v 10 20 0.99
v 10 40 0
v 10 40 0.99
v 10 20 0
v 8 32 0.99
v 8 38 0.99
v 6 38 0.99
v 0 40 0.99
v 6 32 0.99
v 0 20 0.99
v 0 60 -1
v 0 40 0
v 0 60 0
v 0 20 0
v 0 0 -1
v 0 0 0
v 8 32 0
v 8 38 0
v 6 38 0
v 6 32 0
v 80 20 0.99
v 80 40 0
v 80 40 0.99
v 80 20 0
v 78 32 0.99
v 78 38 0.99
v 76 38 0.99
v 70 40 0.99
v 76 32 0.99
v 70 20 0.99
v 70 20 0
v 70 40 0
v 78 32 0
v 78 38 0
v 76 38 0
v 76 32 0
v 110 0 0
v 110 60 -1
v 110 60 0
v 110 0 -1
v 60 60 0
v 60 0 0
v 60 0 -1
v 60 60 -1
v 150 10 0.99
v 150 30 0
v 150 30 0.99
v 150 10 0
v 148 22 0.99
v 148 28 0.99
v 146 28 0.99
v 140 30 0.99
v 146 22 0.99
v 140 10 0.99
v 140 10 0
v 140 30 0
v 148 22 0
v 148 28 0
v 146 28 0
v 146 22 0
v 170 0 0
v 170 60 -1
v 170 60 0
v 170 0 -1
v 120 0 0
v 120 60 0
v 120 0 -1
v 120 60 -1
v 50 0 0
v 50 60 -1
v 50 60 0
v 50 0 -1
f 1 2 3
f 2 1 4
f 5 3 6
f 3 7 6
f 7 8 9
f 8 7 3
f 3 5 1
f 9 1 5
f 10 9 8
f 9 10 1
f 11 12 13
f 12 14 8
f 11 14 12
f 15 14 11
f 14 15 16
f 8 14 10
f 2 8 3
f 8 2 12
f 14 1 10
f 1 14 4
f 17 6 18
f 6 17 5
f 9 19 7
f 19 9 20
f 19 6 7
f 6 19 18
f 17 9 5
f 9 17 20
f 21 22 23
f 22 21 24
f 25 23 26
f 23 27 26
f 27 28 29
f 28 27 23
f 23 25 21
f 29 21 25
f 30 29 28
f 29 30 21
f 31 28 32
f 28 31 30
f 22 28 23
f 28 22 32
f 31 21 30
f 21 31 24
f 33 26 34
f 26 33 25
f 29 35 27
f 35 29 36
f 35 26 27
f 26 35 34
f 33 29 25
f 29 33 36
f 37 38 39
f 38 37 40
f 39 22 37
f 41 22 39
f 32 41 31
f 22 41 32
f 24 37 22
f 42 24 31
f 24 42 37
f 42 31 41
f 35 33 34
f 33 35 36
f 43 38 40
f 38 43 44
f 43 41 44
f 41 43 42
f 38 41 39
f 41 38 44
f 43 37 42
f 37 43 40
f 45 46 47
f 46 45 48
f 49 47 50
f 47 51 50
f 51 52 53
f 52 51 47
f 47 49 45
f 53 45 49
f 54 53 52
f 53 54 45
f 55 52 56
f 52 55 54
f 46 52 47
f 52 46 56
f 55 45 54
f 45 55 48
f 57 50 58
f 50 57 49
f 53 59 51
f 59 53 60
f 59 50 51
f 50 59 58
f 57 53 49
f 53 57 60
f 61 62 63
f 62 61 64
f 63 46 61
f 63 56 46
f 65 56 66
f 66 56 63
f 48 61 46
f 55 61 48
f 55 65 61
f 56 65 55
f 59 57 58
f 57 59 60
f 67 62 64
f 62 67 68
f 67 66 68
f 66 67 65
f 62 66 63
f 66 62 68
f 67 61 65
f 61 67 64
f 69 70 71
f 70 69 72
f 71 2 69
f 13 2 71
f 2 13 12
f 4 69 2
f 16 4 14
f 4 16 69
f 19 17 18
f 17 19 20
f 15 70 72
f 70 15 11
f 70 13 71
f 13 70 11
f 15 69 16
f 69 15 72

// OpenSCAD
// file: ../../Base/PlacementOptions.scad
// Fischertechnik Box Foundation
// Placement Options

// Alignment
NoAlign = 0;
AlignLeft = 1;
AlignBottom = 2;
AlignCenter = 3;
AlignRight = 4;
AlignTop = 5;

// Element rotation degree steps
rotations = [0, -90, -180, -270];

// Rotation
NoRotation = 0;
Rotate0 = 0;
Rotate90 = 1;
Rotate180 = 2;
Rotate270 = 3;

// Docking (seen from above)
NoDock = -1;
DockLeft = 0;
DockTop = 1;
DockRight = 2;
DockCorner = 2;
DockBottom = 3;

// Web corners
LowerLeft = 0;
UpperLeft = 1;
UpperRight = 2;
LowerRight = 3;

// Web position relative to corner
LeftOfCorner = 0;
RightOfCorner = 1;
// file: ../../Base/Boxes.scad
// Fischertechnik Box Foundation
// Pre-designed Boxes

use <Constants.scad>

include <PlacementOptions.scad>

box190Width = 190;
box190Depth = 130;
box130Width = 130;
box130Depth = 95;
boxUsageHeight = 33.9;
boxWallThickness = 2.4;
boxBaseThickness = 1.0;
boxWebWidth = 3.0;

// getBoxWallThickness()
// Gets the wall thickness of a Fischertechnik Box

function getBoxWallThickness() = boxWallThickness;

// Gets the usable height of a fischertechnik box
function getBoxUsageHeight() = boxUsageHeight;

// Gets the thickness of the Fischertechnik box base.
function getBoxBaseThickness() = boxBaseThickness;

// Gets the width of a box web
function getBoxWebWidth() = boxWebWidth;

// Gets the usable inner space of a Box 190 as an x/y-list
function getBox190Space() = [
    box190Width - 2*getBoxWallThickness(), 
    box190Depth - 2*getBoxWallThickness() ];

// Imports the Fischertechnik empty box 130x190 mm and places it at position 0,0
// 190x130 are the outer sizes, the inner space is slightly smaller. Use getBox190Space() to get the inner sizes.
// This module needs the STL file "Fischertechnik Box 130x190.stl" in the library path.
// The box is positioned that the usable inner space is at the 0,0,0 position. The

module Box190() {
    translate([-getBoxWallThickness(),-getBoxWallThickness(),-getBoxBaseThickness()])
        import("Fischertechnik Box 130x190.stl", convexity=3);
}

// Gets the usable inner space of a Box 130 as an x/y-list
function getBox130Space() = [
    box130Width - 2*getBoxWallThickness(), 
    box130Depth - 2*getBoxWallThickness() ];

// Imports the Fischertechnik empty box 95x130 mm and places it at position 0,0
// 190x130 are the outer sizes, the inner space is slightly smaller. Use getBox190Space() to get the inner sizes.
// This module needs the STL file "Fischertechnik Box 95x130.stl" in the library path.
// The box is positioned that the usable inner space is at the 0,0,0 position. The

module Box130() {
    translate([-getBoxWallThickness(),-getBoxWallThickness(),-getBoxBaseThickness()])
        import("Fischertechnik Box 95x130.stl", convexity=3);
}

// Creates a web at the specified box walls
// corner 0 = LowerLeft, 1 = UpperLeft, 2 = UpperRight, 3 = LowerRight
// side 0 = LeftOfCorner, 1 = RightOfCorner
// distance = Distance in mm from the corner
// box = inner width and depth of the box (default: Box 190)
// webWidth = length of the web (default is 3 mms)
// webThickness = thickness of the web (default is 1 mm)

module BoxWeb(corner, side, distance, box=getBox190Space(), webWidth=getBoxWebWidth(), webThickness=1.0) {
    sink = getBoxWallThickness()/2;

    width = (corner % 2 == 0) ? 
            (side == LeftOfCorner ? webWidth : webThickness) :
            (side == LeftOfCorner ? webThickness : webWidth);

    depth = (corner % 2 == 0) ? 
            (side == RightOfCorner ? webWidth : webThickness) :
            (side == RightOfCorner ? webThickness : webWidth);
    
    xDiff = corner == LowerLeft ? 
                (side == LeftOfCorner ? -sink : distance) :
            (corner == UpperLeft ?                
                (side == LeftOfCorner ? distance : -sink) :
            (corner == UpperRight ?
                (side == LeftOfCorner ? box.x-webWidth+sink : box.x-distance-webThickness) :
                (side == LeftOfCorner ? box.x-distance-webThickness: box.x-webWidth+sink)));

    yDiff = corner == LowerLeft ? 
                (side == RightOfCorner ? -sink : distance) :
            (corner == UpperLeft ?
                (side == RightOfCorner ? box.y-distance : box.y-webWidth+sink) :
            (corner == UpperRight ?
                (side == RightOfCorner ? box.y-webWidth+sink : box.y-distance) :
                (side == RightOfCorner ? distance : -sink)));
    
    translate([xDiff, yDiff, -getExcess()])
        cube([width, depth, boxUsageHeight + 2*getExcess()]);
}
// file: ../../Base/Rotation.scad
// Fischertechnik Box Foundation
// Geometry Helpers Rotation

include <PlacementOptions.scad>

// getRotatedSpace(space, rotation=NoRotation)
// Rotates the space dependent on the specified rotation

function getRotatedSpace(space, rotation=NoRotation) = [
    (rotation == Rotate90 || rotation == Rotate270) ? space.y : space.x,
    (rotation == Rotate90 || rotation == Rotate270) ? space.x : space.y
];

// Rotates the given space around the fixed left lower corner
// space = the space the children needs as width/depth list [width,depth]
// rotation = 0 Rotate0 degrees, 1 Rotate90 degrees, 2 Rotate180 degrees, 3 Rotate270 degrees (equivalent to -90)

module RotateFix(space, rotation=Rotate0) {
    dy = (rotation == Rotate0 || rotation == Rotate270) ? 0 :
        (rotation == Rotate90) ? space.x :
        space.y;
    dx = (rotation < Rotate180) ? 0 :
        (rotation == Rotate180) ? space.x :
        space.y;
    
    translate([dx, dy, 0])
        rotate([0, 0, rotations[rotation]])
            children();
}
// file: ../../Base/Alignment.scad
// Fischertechnik Box Foundation
// Geometry Helpers Alignment

include <PlacementOptions.scad>

// getAlignedX(elementWidth, spaceWidth, align=AlignRight, offset=0)
// Gets the aligned X offset of an element with the given
// width in the given space.
// elementWidth = The width of the element to positon
// spaceWidth = The space where the element should be aligned
// align = 0 AlignLeft, 1 AlignCenter, 2 AlignRight
// offset = an optional offset from the aligned position. When
// aligned left or centered, then positive values are in X direction.
// When aligned right then positive values are in negative X direction.

function getAlignedX(elementWidth, spaceWidth, align=AlignRight, offset=0) =
    (align == AlignLeft) ?
        offset :
        ((align == AlignCenter) ?
        (spaceWidth - elementWidth)/2 + offset :
        spaceWidth - offset - elementWidth);

// getAlignedY(elementDepth, spaceDepth, align=AlignTop, offset=0)
// Gets the aligned Y offset of an element with the given
// depth in the given space.
// elementDepth = The depth of the element to positon
// spaceDepth = The space where the element should be aligned
// align = 0 AlignBottom, 1 AlignCenter, 2 AlignTop
// offset = an optional offset from the aligned position. When
// aligned bottom or centered, then positive values are in Y direction.
// When aligned top then positive values are in negative Y direction.

function getAlignedY(elementDepth, spaceDepth, align=AlignTop, offset=0) =
    (align == AlignBottom) ?
        offset :
        ((align == AlignCenter) ?
        (spaceDepth - elementDepth)/2 + offset :
        spaceDepth - offset - elementDepth);
// file: ../../Base/Constants.scad
// Fischertechnik Box Foundation
// Constants

// Constant values necessary for multiple elements

// Base constants
dividerThickness = 1.2;
excess = 0.01;
fragments = 90;
tolerance = 0.8;

// Gets the thickness of a divider 
function getDividerThickness() = dividerThickness;

// Gets the excess that is used to merge walls into each other
function getExcess() = excess;

// Gets amount of fragments of a cylinder
function getFragments() = fragments;

// Gets the inner tolerance of a frame to each side
function getTolerance() = tolerance;


// Fischertechnik specific constants
axisDiameter = 4;
axisBottomDiameter = axisDiameter + 1;
standardEdgeDistance = 2.5;
standardWebDistance = 11.5;
standardCornerLength = 15;
tubeWallFactor = 0.8;
smallPartsFrameHeight = 20;

// Gets axis diameter
function getAxisDiameter() = axisDiameter;

// Gets axis bottom diameter for thicker part at the bottom
function getAxisBottomDiameter() = axisBottomDiameter;

// gets the standard distance to the wall of the box for dockable frames with webs
function getStandardEdgeDistance() = standardEdgeDistance;

// gets the standard distance of each web to the corner of the dockable frame
function getStandardWebDistance() = standardWebDistance;

// gets the standard length of the corner walls of a dockable frame
function getStandardCornerLength() = standardCornerLength;

// gets the wall thickness of a tube.
function getTubeWallThickness() = tubeWallFactor * getDividerThickness();

// gets the frame height for docked small parts boxes.
function getSmallPartsFrameHeight() = smallPartsFrameHeight;
// file: ../TestHelper.scad
// Fischertechnik Box Foundation
// Test Helper

function getPlacementBaseSpace() = [50,60];
function getCubeSpace() = [10,20];

module PlacementBase() {
    color("green")
    translate([0, 0, -1])
        cube([getPlacementBaseSpace().x, getPlacementBaseSpace().y, 1]);
}

module Cube() {
    translate([0,0,-.01])
    difference() {
        cube([getCubeSpace().x,getCubeSpace().y,1]);
        translate([getCubeSpace().x*0.6, getCubeSpace().y*0.6, -1])
            cube([getCubeSpace().x*0.2,getCubeSpace().y*0.3,3]);
    }
}

module Deploy(distance=30) {
    for( i = [0:1:$children-1])
        translate([i*distance, 0])
            children(i);
}
// file: ../../Base/Placement.scad
// Fischertechnik Box Foundation
// Geometry Helpers Placement

use <Constants.scad>
use <Alignment.scad>
use <Rotation.scad>
use <Boxes.scad>

include <PlacementOptions.scad>

// Place(x=0, y=0, elementSpace=[0,0], alignX=AlignLeft, alignY=AlignBottom, rotation=Rotate0, boxSpace=getBox190Space())
// Places the child at the specified position
// y = Y-Position. This is a relative position when an X aligment is specified.
// x = X-Position. This is a relative position when an Y aligment is specified.
// elementSpace = space of the element to be placed [x,y]
// alignX = -1=NoAlign, 0 AlignLeft, 1 AlignCenter, 3 AlignRight (elementSpace and boxSpace required!)
// alignY = -1=NoAlign, 2 AlignBottom, 1 AlignCenter, 4 AlignTop (elementSpace and boxSpace required!)
// rotation = 0 Rotate0 0 degrees, 1 Rotate90 90 degrees, 
// 2 Rotate180 180 degrees, 3 Rotate270 270 degrees (equivalent to -90)
// boxSpace = Inner space of the box where the placement occurs [x,y] - default is Box 190x130 inner space

module Place(x=0, y=0, elementSpace=[0,0], 
  alignX=AlignLeft, alignY=AlignBottom, 
  rotation=NoRotation, boxSpace=getBox190Space()) {

    module Position(x, y, space, rotation=Rotate0) {
        translate([x, y, 0])
            RotateFix(space, rotation)
                children();
    }

    space = getRotatedSpace(elementSpace, rotation);
    alignedX = getAlignedX(space.x, boxSpace.x, alignX, x);
    alignedY = getAlignedY(space.y, boxSpace.y, alignY, y);
    Position(alignedX, alignedY, elementSpace, rotation)
        children();
}

// Center(space=getBox130Space(), elementSpace=[0,0])
// space = Space where the children is centered. For cylinder use centered=true and no elementSpace.
// elementSpace = space of the element to be centered [x,y]

module Center(space=getBox190Space(), elementSpace=[0,0]) {
    Place(elementSpace=elementSpace, boxSpace=space, alignX=AlignCenter, alignY=AlignCenter)
        children();
}

// CenterHorizontal(width=0, y=0, offset=0, space=getBox130Space())
// width = Width of the element to be placed.
// y = Y position of the element
// offset = Offset from the center position (negative will be left of the center)
// space = Space where the element is placed

module CenterHorizontal(width=0, y=0, offset=0, space=getBox190Space()) {
    Place(x=offset, y=y, elementSpace=[width, 0], boxSpace=space, alignX=AlignCenter)
        children(0);
}

// CenterVertical(depth=0, x=0, offset=0, space=getBox130Space())
// depth = Depth of the element to be placed.
// x = X position of the element
// offset = Offset from the center position (negative will be down of the center)
// space = Space where the element is placed

module CenterVertical(depth=0, x=0, offset=0, space=getBox190Space()) {
    Place(x=x, y=offset, elementSpace=[0, depth], boxSpace=space, alignY=AlignCenter)
        children(0);
}

// getIsVertical(align)
// True if the specified alignment needs a vertical orientation for a divider (AlignRight, AlignLeft)

function getIsVertical(align) = (align == AlignRight || align == AlignLeft);

// getIsHorizontal(align)
// True if the specified alignment needs a horizontal orientation for a divider (AlignTop, AlignBottom)

function getIsHorizontal(align) = (align == AlignTop || align == AlignBottom);
// main file
// Fischertechnik Box Foundation
// Geometry Helpers Placement
// Test CenterVertical

use <../../Base/Placement.scad>

use <../TestHelper.scad>

PlacementBase();

CenterVertical(depth=getCubeSpace().y, space=getPlacementBaseSpace())
    Cube();

translate([60, 0]) {
    PlacementBase();
    CenterVertical(depth=getCubeSpace().y, x=10, space=getPlacementBaseSpace())
        Cube();
}

translate([120, 0]) {
    PlacementBase();
    CenterVertical(depth=getCubeSpace().y, x=20, offset=-10, space=getPlacementBaseSpace())
        Cube();
}
